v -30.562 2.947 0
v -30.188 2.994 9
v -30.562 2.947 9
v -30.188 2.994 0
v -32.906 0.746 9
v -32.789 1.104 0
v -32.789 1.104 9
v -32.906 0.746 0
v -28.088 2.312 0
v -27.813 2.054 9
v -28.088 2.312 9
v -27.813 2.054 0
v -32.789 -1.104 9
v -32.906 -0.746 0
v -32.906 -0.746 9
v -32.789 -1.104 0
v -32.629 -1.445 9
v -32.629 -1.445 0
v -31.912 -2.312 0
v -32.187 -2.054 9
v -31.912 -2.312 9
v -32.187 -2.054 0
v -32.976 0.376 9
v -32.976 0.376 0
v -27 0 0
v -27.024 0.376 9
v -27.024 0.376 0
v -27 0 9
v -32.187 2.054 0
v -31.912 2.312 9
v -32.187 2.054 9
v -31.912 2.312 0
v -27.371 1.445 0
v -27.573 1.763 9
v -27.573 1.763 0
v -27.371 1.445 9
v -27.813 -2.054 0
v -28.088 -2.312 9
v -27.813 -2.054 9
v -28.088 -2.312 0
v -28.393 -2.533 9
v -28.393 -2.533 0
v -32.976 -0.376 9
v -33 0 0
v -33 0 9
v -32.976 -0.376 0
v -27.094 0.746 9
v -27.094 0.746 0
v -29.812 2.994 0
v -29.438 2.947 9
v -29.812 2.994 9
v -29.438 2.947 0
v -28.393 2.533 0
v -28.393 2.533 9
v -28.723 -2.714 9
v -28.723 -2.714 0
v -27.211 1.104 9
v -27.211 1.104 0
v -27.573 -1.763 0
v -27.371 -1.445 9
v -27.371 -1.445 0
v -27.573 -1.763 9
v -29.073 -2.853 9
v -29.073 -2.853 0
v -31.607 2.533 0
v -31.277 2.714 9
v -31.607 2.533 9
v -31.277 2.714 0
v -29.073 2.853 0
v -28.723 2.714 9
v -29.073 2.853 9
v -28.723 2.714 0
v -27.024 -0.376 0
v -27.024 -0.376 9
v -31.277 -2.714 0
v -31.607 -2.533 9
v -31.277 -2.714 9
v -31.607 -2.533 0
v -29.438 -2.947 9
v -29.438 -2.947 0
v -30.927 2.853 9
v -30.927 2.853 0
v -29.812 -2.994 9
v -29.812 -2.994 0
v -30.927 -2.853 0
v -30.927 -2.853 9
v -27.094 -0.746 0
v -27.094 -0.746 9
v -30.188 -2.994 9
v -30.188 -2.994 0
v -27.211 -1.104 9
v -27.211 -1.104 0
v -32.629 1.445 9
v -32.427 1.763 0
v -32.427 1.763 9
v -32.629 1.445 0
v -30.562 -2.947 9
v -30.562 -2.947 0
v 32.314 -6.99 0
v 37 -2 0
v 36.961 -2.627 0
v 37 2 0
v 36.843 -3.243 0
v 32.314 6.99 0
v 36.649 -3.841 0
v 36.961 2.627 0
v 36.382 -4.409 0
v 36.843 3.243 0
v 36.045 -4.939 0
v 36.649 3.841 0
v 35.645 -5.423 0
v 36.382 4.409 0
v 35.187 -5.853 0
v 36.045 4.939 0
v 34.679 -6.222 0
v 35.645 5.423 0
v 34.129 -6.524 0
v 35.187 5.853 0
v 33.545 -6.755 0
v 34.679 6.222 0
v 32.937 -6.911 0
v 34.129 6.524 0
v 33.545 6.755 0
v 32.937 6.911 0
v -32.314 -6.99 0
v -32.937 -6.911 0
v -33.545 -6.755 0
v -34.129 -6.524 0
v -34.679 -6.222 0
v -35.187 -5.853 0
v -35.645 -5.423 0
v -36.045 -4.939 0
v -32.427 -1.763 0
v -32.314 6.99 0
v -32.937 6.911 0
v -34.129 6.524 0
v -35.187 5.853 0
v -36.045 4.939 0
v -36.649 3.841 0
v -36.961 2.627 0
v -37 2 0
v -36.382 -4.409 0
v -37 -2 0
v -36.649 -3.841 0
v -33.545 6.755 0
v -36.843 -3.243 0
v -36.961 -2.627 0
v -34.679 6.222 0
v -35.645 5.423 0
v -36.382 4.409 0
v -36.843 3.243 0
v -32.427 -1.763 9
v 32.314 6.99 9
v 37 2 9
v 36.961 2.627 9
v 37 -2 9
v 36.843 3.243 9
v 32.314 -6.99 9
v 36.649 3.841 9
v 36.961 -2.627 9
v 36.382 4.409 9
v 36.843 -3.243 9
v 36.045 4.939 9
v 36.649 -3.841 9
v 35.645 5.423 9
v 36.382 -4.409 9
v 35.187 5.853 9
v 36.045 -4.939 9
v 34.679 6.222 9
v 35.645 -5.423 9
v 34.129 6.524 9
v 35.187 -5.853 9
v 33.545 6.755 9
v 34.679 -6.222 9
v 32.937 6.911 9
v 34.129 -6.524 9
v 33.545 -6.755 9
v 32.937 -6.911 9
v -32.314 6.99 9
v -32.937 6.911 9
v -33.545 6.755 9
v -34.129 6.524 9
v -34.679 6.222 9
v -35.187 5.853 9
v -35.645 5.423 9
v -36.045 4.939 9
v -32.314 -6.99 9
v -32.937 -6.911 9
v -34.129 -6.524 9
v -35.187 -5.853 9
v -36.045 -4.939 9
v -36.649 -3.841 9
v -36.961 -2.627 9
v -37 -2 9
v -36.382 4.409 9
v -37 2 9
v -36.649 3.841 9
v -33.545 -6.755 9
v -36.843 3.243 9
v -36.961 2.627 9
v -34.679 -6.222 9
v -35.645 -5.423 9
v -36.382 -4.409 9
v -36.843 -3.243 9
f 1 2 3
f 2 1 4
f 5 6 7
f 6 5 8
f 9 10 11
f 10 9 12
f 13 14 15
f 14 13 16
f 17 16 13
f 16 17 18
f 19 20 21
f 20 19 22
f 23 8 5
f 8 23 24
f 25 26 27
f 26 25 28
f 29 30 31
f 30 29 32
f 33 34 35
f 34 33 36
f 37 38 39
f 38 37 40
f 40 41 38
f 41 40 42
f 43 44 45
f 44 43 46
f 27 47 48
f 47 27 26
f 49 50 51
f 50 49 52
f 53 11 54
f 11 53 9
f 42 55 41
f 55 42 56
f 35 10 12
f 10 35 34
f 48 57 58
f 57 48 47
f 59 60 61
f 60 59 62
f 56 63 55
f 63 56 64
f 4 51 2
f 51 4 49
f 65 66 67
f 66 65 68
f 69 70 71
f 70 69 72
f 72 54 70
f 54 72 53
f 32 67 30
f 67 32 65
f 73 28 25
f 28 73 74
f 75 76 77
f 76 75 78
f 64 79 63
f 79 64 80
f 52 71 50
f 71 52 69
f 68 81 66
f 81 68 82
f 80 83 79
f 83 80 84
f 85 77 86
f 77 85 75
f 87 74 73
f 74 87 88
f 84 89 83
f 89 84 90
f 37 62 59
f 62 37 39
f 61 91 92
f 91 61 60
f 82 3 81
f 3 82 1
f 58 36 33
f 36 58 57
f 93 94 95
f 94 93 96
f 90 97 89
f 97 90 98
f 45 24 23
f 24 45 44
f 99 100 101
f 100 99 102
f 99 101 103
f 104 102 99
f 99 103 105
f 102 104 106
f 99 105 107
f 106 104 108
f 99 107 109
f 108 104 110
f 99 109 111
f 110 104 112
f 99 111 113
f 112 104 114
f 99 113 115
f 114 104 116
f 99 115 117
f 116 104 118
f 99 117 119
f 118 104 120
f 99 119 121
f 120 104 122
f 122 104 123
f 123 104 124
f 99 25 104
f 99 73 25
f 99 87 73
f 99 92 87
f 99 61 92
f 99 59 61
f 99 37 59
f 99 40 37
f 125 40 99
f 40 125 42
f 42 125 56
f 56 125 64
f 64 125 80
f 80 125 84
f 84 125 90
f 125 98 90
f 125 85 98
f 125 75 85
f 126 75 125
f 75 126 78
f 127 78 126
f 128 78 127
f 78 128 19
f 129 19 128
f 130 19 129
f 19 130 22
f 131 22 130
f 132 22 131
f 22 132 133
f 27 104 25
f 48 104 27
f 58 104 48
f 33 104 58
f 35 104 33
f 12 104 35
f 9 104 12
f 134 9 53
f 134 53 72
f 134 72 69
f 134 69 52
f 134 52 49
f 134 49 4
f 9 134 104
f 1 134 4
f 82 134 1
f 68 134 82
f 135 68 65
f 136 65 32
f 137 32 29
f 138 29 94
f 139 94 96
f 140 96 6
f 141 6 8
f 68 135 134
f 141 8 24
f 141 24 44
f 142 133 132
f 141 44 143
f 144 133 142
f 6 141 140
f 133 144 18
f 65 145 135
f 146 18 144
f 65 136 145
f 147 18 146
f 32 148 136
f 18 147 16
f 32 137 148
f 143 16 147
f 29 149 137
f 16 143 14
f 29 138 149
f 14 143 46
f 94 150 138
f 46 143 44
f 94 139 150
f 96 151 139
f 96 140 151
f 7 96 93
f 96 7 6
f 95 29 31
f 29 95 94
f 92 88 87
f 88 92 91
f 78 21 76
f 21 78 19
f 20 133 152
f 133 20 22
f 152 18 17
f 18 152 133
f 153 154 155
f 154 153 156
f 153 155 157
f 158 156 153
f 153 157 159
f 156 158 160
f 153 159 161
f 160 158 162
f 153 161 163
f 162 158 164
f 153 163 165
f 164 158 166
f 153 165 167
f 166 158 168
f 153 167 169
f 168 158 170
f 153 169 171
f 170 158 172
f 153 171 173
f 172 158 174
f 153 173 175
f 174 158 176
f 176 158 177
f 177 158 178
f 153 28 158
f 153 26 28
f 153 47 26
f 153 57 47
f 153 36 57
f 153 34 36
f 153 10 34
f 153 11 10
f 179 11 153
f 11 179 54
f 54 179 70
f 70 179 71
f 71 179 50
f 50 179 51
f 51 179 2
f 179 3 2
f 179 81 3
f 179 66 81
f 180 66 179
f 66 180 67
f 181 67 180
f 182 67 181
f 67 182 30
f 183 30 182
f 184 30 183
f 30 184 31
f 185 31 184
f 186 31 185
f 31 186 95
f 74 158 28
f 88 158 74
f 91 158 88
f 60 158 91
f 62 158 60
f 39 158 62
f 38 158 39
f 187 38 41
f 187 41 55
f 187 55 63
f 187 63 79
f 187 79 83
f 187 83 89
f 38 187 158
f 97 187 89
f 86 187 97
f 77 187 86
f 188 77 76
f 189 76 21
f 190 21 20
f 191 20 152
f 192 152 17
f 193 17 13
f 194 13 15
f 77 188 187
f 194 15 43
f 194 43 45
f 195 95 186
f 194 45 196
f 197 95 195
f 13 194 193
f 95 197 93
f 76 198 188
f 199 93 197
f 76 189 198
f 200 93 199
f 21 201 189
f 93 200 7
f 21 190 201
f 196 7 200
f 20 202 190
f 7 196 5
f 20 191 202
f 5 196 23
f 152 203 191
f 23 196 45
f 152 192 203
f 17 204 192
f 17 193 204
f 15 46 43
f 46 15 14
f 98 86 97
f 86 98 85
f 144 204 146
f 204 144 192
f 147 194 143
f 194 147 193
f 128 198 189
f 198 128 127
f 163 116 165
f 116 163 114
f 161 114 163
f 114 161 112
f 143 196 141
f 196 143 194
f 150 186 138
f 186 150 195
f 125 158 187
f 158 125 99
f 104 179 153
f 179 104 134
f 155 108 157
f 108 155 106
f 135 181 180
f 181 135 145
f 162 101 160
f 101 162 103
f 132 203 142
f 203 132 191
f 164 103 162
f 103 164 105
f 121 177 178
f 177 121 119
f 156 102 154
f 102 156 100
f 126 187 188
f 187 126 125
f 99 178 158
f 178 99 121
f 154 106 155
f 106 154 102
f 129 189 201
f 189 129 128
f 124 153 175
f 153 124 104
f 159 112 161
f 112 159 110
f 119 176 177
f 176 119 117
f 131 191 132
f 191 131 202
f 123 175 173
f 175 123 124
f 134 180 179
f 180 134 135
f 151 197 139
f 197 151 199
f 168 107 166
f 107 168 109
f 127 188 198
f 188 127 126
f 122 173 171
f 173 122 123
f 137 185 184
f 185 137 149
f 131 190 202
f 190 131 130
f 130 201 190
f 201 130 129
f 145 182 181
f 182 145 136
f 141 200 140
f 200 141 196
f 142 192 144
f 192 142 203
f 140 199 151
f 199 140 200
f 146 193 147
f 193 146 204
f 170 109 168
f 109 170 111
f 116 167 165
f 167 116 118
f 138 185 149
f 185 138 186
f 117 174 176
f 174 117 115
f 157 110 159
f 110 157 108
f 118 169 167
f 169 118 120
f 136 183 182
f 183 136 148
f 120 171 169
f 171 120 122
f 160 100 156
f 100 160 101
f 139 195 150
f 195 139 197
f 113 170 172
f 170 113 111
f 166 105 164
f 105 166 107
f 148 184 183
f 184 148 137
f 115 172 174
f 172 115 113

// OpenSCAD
$fn = 50;


difference() {
	union() {
		hull() {
			translate(v = [-32.0000000000, 2.0000000000, 0]) {
				cylinder(h = 9, r = 5);
			}
			translate(v = [32.0000000000, 2.0000000000, 0]) {
				cylinder(h = 9, r = 5);
			}
			translate(v = [-32.0000000000, -2.0000000000, 0]) {
				cylinder(h = 9, r = 5);
			}
			translate(v = [32.0000000000, -2.0000000000, 0]) {
				cylinder(h = 9, r = 5);
			}
		}
	}
	union() {
		translate(v = [-30.0000000000, 0.0000000000, 0]) {
			cylinder(h = 9, r = 3.0000000000);
		}
		translate(v = [-30.0000000000, 0.0000000000, 0]) {
			cylinder(h = 9, r = 1.5000000000);
		}
		translate(v = [-30.0000000000, 0.0000000000, 0]) {
			cylinder(h = 9, r = 1.5000000000);
		}
		translate(v = [-30.0000000000, 0.0000000000, 0]) {
			cylinder(h = 9, r = 1.5000000000);
		}
	}
}
